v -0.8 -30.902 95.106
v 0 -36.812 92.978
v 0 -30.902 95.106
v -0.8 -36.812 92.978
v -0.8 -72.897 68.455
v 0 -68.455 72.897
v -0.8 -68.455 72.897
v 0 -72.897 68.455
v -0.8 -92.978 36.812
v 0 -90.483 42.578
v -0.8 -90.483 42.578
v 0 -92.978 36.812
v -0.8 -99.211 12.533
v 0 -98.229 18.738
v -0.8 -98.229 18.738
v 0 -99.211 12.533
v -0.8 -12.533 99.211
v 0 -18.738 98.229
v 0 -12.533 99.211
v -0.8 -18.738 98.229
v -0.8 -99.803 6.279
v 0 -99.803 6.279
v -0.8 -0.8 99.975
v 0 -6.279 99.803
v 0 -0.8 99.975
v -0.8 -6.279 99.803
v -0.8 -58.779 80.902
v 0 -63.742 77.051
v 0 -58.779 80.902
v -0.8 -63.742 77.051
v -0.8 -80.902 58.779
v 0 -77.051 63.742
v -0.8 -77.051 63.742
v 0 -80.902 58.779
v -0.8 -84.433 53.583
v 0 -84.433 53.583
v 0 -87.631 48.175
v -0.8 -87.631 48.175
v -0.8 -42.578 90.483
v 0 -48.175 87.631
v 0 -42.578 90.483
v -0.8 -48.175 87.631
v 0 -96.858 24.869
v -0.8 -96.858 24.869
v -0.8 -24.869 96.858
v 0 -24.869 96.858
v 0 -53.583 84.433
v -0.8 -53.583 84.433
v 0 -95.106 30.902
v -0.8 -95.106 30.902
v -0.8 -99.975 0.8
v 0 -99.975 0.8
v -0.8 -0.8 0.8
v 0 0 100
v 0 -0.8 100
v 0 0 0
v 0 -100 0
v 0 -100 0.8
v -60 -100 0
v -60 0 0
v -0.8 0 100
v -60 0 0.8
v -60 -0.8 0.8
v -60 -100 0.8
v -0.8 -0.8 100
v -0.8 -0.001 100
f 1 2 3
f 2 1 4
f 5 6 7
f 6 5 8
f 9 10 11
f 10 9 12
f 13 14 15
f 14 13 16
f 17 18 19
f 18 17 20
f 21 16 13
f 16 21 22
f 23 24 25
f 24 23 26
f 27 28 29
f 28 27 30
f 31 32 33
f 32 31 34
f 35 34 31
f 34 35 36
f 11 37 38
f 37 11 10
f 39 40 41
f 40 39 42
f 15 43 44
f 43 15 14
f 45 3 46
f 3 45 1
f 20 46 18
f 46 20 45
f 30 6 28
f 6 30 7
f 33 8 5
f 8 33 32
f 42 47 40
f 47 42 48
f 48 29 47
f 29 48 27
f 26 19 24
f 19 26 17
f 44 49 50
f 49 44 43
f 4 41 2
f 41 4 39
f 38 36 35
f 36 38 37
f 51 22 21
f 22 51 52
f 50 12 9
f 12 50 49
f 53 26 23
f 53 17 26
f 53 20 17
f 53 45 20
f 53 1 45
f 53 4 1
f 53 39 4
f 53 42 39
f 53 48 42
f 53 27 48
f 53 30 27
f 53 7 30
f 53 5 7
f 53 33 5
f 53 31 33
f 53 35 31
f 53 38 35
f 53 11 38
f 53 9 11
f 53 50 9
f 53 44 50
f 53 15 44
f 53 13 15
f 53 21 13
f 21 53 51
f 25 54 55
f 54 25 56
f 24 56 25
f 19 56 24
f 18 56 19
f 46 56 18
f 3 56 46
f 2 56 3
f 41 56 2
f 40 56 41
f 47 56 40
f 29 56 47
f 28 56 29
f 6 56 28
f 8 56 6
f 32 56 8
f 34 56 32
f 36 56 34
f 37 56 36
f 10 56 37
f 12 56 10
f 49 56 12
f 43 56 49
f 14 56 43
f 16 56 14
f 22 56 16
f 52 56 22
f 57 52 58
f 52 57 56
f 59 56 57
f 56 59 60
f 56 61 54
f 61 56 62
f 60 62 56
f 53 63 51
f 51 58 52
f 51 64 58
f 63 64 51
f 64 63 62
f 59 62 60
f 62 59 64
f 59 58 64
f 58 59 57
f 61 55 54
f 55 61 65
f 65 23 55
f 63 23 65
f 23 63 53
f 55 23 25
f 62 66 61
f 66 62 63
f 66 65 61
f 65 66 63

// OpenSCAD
wt = 0.8;       // wall thickness
h = 100;        // height
w = 60;         // width

translate([-w, -h, 0])cube([w, h, wt], false);
translate([0, -wt, 0])
    xz_extrude([[0, 0], [-w, 0], [-w, wt], [-wt, h], [0, h]], wt, center = false);
intersection(){
    rotate([0, 90,0])cylinder(2*wt, h, h, center=true, $fn=100);
    translate([-h, -h, 0])cube([h, h, h], false);
};

module xy_extrude(points, height, center = true) {
    linear_extrude(height = height, center = center) 
        polygon(points = points); 
};

module xz_extrude(points, height, center = true){
    rotate([90, 0, 0])
        mirror([0, 0, 1])        
            xy_extrude(points, height, center);            
};
